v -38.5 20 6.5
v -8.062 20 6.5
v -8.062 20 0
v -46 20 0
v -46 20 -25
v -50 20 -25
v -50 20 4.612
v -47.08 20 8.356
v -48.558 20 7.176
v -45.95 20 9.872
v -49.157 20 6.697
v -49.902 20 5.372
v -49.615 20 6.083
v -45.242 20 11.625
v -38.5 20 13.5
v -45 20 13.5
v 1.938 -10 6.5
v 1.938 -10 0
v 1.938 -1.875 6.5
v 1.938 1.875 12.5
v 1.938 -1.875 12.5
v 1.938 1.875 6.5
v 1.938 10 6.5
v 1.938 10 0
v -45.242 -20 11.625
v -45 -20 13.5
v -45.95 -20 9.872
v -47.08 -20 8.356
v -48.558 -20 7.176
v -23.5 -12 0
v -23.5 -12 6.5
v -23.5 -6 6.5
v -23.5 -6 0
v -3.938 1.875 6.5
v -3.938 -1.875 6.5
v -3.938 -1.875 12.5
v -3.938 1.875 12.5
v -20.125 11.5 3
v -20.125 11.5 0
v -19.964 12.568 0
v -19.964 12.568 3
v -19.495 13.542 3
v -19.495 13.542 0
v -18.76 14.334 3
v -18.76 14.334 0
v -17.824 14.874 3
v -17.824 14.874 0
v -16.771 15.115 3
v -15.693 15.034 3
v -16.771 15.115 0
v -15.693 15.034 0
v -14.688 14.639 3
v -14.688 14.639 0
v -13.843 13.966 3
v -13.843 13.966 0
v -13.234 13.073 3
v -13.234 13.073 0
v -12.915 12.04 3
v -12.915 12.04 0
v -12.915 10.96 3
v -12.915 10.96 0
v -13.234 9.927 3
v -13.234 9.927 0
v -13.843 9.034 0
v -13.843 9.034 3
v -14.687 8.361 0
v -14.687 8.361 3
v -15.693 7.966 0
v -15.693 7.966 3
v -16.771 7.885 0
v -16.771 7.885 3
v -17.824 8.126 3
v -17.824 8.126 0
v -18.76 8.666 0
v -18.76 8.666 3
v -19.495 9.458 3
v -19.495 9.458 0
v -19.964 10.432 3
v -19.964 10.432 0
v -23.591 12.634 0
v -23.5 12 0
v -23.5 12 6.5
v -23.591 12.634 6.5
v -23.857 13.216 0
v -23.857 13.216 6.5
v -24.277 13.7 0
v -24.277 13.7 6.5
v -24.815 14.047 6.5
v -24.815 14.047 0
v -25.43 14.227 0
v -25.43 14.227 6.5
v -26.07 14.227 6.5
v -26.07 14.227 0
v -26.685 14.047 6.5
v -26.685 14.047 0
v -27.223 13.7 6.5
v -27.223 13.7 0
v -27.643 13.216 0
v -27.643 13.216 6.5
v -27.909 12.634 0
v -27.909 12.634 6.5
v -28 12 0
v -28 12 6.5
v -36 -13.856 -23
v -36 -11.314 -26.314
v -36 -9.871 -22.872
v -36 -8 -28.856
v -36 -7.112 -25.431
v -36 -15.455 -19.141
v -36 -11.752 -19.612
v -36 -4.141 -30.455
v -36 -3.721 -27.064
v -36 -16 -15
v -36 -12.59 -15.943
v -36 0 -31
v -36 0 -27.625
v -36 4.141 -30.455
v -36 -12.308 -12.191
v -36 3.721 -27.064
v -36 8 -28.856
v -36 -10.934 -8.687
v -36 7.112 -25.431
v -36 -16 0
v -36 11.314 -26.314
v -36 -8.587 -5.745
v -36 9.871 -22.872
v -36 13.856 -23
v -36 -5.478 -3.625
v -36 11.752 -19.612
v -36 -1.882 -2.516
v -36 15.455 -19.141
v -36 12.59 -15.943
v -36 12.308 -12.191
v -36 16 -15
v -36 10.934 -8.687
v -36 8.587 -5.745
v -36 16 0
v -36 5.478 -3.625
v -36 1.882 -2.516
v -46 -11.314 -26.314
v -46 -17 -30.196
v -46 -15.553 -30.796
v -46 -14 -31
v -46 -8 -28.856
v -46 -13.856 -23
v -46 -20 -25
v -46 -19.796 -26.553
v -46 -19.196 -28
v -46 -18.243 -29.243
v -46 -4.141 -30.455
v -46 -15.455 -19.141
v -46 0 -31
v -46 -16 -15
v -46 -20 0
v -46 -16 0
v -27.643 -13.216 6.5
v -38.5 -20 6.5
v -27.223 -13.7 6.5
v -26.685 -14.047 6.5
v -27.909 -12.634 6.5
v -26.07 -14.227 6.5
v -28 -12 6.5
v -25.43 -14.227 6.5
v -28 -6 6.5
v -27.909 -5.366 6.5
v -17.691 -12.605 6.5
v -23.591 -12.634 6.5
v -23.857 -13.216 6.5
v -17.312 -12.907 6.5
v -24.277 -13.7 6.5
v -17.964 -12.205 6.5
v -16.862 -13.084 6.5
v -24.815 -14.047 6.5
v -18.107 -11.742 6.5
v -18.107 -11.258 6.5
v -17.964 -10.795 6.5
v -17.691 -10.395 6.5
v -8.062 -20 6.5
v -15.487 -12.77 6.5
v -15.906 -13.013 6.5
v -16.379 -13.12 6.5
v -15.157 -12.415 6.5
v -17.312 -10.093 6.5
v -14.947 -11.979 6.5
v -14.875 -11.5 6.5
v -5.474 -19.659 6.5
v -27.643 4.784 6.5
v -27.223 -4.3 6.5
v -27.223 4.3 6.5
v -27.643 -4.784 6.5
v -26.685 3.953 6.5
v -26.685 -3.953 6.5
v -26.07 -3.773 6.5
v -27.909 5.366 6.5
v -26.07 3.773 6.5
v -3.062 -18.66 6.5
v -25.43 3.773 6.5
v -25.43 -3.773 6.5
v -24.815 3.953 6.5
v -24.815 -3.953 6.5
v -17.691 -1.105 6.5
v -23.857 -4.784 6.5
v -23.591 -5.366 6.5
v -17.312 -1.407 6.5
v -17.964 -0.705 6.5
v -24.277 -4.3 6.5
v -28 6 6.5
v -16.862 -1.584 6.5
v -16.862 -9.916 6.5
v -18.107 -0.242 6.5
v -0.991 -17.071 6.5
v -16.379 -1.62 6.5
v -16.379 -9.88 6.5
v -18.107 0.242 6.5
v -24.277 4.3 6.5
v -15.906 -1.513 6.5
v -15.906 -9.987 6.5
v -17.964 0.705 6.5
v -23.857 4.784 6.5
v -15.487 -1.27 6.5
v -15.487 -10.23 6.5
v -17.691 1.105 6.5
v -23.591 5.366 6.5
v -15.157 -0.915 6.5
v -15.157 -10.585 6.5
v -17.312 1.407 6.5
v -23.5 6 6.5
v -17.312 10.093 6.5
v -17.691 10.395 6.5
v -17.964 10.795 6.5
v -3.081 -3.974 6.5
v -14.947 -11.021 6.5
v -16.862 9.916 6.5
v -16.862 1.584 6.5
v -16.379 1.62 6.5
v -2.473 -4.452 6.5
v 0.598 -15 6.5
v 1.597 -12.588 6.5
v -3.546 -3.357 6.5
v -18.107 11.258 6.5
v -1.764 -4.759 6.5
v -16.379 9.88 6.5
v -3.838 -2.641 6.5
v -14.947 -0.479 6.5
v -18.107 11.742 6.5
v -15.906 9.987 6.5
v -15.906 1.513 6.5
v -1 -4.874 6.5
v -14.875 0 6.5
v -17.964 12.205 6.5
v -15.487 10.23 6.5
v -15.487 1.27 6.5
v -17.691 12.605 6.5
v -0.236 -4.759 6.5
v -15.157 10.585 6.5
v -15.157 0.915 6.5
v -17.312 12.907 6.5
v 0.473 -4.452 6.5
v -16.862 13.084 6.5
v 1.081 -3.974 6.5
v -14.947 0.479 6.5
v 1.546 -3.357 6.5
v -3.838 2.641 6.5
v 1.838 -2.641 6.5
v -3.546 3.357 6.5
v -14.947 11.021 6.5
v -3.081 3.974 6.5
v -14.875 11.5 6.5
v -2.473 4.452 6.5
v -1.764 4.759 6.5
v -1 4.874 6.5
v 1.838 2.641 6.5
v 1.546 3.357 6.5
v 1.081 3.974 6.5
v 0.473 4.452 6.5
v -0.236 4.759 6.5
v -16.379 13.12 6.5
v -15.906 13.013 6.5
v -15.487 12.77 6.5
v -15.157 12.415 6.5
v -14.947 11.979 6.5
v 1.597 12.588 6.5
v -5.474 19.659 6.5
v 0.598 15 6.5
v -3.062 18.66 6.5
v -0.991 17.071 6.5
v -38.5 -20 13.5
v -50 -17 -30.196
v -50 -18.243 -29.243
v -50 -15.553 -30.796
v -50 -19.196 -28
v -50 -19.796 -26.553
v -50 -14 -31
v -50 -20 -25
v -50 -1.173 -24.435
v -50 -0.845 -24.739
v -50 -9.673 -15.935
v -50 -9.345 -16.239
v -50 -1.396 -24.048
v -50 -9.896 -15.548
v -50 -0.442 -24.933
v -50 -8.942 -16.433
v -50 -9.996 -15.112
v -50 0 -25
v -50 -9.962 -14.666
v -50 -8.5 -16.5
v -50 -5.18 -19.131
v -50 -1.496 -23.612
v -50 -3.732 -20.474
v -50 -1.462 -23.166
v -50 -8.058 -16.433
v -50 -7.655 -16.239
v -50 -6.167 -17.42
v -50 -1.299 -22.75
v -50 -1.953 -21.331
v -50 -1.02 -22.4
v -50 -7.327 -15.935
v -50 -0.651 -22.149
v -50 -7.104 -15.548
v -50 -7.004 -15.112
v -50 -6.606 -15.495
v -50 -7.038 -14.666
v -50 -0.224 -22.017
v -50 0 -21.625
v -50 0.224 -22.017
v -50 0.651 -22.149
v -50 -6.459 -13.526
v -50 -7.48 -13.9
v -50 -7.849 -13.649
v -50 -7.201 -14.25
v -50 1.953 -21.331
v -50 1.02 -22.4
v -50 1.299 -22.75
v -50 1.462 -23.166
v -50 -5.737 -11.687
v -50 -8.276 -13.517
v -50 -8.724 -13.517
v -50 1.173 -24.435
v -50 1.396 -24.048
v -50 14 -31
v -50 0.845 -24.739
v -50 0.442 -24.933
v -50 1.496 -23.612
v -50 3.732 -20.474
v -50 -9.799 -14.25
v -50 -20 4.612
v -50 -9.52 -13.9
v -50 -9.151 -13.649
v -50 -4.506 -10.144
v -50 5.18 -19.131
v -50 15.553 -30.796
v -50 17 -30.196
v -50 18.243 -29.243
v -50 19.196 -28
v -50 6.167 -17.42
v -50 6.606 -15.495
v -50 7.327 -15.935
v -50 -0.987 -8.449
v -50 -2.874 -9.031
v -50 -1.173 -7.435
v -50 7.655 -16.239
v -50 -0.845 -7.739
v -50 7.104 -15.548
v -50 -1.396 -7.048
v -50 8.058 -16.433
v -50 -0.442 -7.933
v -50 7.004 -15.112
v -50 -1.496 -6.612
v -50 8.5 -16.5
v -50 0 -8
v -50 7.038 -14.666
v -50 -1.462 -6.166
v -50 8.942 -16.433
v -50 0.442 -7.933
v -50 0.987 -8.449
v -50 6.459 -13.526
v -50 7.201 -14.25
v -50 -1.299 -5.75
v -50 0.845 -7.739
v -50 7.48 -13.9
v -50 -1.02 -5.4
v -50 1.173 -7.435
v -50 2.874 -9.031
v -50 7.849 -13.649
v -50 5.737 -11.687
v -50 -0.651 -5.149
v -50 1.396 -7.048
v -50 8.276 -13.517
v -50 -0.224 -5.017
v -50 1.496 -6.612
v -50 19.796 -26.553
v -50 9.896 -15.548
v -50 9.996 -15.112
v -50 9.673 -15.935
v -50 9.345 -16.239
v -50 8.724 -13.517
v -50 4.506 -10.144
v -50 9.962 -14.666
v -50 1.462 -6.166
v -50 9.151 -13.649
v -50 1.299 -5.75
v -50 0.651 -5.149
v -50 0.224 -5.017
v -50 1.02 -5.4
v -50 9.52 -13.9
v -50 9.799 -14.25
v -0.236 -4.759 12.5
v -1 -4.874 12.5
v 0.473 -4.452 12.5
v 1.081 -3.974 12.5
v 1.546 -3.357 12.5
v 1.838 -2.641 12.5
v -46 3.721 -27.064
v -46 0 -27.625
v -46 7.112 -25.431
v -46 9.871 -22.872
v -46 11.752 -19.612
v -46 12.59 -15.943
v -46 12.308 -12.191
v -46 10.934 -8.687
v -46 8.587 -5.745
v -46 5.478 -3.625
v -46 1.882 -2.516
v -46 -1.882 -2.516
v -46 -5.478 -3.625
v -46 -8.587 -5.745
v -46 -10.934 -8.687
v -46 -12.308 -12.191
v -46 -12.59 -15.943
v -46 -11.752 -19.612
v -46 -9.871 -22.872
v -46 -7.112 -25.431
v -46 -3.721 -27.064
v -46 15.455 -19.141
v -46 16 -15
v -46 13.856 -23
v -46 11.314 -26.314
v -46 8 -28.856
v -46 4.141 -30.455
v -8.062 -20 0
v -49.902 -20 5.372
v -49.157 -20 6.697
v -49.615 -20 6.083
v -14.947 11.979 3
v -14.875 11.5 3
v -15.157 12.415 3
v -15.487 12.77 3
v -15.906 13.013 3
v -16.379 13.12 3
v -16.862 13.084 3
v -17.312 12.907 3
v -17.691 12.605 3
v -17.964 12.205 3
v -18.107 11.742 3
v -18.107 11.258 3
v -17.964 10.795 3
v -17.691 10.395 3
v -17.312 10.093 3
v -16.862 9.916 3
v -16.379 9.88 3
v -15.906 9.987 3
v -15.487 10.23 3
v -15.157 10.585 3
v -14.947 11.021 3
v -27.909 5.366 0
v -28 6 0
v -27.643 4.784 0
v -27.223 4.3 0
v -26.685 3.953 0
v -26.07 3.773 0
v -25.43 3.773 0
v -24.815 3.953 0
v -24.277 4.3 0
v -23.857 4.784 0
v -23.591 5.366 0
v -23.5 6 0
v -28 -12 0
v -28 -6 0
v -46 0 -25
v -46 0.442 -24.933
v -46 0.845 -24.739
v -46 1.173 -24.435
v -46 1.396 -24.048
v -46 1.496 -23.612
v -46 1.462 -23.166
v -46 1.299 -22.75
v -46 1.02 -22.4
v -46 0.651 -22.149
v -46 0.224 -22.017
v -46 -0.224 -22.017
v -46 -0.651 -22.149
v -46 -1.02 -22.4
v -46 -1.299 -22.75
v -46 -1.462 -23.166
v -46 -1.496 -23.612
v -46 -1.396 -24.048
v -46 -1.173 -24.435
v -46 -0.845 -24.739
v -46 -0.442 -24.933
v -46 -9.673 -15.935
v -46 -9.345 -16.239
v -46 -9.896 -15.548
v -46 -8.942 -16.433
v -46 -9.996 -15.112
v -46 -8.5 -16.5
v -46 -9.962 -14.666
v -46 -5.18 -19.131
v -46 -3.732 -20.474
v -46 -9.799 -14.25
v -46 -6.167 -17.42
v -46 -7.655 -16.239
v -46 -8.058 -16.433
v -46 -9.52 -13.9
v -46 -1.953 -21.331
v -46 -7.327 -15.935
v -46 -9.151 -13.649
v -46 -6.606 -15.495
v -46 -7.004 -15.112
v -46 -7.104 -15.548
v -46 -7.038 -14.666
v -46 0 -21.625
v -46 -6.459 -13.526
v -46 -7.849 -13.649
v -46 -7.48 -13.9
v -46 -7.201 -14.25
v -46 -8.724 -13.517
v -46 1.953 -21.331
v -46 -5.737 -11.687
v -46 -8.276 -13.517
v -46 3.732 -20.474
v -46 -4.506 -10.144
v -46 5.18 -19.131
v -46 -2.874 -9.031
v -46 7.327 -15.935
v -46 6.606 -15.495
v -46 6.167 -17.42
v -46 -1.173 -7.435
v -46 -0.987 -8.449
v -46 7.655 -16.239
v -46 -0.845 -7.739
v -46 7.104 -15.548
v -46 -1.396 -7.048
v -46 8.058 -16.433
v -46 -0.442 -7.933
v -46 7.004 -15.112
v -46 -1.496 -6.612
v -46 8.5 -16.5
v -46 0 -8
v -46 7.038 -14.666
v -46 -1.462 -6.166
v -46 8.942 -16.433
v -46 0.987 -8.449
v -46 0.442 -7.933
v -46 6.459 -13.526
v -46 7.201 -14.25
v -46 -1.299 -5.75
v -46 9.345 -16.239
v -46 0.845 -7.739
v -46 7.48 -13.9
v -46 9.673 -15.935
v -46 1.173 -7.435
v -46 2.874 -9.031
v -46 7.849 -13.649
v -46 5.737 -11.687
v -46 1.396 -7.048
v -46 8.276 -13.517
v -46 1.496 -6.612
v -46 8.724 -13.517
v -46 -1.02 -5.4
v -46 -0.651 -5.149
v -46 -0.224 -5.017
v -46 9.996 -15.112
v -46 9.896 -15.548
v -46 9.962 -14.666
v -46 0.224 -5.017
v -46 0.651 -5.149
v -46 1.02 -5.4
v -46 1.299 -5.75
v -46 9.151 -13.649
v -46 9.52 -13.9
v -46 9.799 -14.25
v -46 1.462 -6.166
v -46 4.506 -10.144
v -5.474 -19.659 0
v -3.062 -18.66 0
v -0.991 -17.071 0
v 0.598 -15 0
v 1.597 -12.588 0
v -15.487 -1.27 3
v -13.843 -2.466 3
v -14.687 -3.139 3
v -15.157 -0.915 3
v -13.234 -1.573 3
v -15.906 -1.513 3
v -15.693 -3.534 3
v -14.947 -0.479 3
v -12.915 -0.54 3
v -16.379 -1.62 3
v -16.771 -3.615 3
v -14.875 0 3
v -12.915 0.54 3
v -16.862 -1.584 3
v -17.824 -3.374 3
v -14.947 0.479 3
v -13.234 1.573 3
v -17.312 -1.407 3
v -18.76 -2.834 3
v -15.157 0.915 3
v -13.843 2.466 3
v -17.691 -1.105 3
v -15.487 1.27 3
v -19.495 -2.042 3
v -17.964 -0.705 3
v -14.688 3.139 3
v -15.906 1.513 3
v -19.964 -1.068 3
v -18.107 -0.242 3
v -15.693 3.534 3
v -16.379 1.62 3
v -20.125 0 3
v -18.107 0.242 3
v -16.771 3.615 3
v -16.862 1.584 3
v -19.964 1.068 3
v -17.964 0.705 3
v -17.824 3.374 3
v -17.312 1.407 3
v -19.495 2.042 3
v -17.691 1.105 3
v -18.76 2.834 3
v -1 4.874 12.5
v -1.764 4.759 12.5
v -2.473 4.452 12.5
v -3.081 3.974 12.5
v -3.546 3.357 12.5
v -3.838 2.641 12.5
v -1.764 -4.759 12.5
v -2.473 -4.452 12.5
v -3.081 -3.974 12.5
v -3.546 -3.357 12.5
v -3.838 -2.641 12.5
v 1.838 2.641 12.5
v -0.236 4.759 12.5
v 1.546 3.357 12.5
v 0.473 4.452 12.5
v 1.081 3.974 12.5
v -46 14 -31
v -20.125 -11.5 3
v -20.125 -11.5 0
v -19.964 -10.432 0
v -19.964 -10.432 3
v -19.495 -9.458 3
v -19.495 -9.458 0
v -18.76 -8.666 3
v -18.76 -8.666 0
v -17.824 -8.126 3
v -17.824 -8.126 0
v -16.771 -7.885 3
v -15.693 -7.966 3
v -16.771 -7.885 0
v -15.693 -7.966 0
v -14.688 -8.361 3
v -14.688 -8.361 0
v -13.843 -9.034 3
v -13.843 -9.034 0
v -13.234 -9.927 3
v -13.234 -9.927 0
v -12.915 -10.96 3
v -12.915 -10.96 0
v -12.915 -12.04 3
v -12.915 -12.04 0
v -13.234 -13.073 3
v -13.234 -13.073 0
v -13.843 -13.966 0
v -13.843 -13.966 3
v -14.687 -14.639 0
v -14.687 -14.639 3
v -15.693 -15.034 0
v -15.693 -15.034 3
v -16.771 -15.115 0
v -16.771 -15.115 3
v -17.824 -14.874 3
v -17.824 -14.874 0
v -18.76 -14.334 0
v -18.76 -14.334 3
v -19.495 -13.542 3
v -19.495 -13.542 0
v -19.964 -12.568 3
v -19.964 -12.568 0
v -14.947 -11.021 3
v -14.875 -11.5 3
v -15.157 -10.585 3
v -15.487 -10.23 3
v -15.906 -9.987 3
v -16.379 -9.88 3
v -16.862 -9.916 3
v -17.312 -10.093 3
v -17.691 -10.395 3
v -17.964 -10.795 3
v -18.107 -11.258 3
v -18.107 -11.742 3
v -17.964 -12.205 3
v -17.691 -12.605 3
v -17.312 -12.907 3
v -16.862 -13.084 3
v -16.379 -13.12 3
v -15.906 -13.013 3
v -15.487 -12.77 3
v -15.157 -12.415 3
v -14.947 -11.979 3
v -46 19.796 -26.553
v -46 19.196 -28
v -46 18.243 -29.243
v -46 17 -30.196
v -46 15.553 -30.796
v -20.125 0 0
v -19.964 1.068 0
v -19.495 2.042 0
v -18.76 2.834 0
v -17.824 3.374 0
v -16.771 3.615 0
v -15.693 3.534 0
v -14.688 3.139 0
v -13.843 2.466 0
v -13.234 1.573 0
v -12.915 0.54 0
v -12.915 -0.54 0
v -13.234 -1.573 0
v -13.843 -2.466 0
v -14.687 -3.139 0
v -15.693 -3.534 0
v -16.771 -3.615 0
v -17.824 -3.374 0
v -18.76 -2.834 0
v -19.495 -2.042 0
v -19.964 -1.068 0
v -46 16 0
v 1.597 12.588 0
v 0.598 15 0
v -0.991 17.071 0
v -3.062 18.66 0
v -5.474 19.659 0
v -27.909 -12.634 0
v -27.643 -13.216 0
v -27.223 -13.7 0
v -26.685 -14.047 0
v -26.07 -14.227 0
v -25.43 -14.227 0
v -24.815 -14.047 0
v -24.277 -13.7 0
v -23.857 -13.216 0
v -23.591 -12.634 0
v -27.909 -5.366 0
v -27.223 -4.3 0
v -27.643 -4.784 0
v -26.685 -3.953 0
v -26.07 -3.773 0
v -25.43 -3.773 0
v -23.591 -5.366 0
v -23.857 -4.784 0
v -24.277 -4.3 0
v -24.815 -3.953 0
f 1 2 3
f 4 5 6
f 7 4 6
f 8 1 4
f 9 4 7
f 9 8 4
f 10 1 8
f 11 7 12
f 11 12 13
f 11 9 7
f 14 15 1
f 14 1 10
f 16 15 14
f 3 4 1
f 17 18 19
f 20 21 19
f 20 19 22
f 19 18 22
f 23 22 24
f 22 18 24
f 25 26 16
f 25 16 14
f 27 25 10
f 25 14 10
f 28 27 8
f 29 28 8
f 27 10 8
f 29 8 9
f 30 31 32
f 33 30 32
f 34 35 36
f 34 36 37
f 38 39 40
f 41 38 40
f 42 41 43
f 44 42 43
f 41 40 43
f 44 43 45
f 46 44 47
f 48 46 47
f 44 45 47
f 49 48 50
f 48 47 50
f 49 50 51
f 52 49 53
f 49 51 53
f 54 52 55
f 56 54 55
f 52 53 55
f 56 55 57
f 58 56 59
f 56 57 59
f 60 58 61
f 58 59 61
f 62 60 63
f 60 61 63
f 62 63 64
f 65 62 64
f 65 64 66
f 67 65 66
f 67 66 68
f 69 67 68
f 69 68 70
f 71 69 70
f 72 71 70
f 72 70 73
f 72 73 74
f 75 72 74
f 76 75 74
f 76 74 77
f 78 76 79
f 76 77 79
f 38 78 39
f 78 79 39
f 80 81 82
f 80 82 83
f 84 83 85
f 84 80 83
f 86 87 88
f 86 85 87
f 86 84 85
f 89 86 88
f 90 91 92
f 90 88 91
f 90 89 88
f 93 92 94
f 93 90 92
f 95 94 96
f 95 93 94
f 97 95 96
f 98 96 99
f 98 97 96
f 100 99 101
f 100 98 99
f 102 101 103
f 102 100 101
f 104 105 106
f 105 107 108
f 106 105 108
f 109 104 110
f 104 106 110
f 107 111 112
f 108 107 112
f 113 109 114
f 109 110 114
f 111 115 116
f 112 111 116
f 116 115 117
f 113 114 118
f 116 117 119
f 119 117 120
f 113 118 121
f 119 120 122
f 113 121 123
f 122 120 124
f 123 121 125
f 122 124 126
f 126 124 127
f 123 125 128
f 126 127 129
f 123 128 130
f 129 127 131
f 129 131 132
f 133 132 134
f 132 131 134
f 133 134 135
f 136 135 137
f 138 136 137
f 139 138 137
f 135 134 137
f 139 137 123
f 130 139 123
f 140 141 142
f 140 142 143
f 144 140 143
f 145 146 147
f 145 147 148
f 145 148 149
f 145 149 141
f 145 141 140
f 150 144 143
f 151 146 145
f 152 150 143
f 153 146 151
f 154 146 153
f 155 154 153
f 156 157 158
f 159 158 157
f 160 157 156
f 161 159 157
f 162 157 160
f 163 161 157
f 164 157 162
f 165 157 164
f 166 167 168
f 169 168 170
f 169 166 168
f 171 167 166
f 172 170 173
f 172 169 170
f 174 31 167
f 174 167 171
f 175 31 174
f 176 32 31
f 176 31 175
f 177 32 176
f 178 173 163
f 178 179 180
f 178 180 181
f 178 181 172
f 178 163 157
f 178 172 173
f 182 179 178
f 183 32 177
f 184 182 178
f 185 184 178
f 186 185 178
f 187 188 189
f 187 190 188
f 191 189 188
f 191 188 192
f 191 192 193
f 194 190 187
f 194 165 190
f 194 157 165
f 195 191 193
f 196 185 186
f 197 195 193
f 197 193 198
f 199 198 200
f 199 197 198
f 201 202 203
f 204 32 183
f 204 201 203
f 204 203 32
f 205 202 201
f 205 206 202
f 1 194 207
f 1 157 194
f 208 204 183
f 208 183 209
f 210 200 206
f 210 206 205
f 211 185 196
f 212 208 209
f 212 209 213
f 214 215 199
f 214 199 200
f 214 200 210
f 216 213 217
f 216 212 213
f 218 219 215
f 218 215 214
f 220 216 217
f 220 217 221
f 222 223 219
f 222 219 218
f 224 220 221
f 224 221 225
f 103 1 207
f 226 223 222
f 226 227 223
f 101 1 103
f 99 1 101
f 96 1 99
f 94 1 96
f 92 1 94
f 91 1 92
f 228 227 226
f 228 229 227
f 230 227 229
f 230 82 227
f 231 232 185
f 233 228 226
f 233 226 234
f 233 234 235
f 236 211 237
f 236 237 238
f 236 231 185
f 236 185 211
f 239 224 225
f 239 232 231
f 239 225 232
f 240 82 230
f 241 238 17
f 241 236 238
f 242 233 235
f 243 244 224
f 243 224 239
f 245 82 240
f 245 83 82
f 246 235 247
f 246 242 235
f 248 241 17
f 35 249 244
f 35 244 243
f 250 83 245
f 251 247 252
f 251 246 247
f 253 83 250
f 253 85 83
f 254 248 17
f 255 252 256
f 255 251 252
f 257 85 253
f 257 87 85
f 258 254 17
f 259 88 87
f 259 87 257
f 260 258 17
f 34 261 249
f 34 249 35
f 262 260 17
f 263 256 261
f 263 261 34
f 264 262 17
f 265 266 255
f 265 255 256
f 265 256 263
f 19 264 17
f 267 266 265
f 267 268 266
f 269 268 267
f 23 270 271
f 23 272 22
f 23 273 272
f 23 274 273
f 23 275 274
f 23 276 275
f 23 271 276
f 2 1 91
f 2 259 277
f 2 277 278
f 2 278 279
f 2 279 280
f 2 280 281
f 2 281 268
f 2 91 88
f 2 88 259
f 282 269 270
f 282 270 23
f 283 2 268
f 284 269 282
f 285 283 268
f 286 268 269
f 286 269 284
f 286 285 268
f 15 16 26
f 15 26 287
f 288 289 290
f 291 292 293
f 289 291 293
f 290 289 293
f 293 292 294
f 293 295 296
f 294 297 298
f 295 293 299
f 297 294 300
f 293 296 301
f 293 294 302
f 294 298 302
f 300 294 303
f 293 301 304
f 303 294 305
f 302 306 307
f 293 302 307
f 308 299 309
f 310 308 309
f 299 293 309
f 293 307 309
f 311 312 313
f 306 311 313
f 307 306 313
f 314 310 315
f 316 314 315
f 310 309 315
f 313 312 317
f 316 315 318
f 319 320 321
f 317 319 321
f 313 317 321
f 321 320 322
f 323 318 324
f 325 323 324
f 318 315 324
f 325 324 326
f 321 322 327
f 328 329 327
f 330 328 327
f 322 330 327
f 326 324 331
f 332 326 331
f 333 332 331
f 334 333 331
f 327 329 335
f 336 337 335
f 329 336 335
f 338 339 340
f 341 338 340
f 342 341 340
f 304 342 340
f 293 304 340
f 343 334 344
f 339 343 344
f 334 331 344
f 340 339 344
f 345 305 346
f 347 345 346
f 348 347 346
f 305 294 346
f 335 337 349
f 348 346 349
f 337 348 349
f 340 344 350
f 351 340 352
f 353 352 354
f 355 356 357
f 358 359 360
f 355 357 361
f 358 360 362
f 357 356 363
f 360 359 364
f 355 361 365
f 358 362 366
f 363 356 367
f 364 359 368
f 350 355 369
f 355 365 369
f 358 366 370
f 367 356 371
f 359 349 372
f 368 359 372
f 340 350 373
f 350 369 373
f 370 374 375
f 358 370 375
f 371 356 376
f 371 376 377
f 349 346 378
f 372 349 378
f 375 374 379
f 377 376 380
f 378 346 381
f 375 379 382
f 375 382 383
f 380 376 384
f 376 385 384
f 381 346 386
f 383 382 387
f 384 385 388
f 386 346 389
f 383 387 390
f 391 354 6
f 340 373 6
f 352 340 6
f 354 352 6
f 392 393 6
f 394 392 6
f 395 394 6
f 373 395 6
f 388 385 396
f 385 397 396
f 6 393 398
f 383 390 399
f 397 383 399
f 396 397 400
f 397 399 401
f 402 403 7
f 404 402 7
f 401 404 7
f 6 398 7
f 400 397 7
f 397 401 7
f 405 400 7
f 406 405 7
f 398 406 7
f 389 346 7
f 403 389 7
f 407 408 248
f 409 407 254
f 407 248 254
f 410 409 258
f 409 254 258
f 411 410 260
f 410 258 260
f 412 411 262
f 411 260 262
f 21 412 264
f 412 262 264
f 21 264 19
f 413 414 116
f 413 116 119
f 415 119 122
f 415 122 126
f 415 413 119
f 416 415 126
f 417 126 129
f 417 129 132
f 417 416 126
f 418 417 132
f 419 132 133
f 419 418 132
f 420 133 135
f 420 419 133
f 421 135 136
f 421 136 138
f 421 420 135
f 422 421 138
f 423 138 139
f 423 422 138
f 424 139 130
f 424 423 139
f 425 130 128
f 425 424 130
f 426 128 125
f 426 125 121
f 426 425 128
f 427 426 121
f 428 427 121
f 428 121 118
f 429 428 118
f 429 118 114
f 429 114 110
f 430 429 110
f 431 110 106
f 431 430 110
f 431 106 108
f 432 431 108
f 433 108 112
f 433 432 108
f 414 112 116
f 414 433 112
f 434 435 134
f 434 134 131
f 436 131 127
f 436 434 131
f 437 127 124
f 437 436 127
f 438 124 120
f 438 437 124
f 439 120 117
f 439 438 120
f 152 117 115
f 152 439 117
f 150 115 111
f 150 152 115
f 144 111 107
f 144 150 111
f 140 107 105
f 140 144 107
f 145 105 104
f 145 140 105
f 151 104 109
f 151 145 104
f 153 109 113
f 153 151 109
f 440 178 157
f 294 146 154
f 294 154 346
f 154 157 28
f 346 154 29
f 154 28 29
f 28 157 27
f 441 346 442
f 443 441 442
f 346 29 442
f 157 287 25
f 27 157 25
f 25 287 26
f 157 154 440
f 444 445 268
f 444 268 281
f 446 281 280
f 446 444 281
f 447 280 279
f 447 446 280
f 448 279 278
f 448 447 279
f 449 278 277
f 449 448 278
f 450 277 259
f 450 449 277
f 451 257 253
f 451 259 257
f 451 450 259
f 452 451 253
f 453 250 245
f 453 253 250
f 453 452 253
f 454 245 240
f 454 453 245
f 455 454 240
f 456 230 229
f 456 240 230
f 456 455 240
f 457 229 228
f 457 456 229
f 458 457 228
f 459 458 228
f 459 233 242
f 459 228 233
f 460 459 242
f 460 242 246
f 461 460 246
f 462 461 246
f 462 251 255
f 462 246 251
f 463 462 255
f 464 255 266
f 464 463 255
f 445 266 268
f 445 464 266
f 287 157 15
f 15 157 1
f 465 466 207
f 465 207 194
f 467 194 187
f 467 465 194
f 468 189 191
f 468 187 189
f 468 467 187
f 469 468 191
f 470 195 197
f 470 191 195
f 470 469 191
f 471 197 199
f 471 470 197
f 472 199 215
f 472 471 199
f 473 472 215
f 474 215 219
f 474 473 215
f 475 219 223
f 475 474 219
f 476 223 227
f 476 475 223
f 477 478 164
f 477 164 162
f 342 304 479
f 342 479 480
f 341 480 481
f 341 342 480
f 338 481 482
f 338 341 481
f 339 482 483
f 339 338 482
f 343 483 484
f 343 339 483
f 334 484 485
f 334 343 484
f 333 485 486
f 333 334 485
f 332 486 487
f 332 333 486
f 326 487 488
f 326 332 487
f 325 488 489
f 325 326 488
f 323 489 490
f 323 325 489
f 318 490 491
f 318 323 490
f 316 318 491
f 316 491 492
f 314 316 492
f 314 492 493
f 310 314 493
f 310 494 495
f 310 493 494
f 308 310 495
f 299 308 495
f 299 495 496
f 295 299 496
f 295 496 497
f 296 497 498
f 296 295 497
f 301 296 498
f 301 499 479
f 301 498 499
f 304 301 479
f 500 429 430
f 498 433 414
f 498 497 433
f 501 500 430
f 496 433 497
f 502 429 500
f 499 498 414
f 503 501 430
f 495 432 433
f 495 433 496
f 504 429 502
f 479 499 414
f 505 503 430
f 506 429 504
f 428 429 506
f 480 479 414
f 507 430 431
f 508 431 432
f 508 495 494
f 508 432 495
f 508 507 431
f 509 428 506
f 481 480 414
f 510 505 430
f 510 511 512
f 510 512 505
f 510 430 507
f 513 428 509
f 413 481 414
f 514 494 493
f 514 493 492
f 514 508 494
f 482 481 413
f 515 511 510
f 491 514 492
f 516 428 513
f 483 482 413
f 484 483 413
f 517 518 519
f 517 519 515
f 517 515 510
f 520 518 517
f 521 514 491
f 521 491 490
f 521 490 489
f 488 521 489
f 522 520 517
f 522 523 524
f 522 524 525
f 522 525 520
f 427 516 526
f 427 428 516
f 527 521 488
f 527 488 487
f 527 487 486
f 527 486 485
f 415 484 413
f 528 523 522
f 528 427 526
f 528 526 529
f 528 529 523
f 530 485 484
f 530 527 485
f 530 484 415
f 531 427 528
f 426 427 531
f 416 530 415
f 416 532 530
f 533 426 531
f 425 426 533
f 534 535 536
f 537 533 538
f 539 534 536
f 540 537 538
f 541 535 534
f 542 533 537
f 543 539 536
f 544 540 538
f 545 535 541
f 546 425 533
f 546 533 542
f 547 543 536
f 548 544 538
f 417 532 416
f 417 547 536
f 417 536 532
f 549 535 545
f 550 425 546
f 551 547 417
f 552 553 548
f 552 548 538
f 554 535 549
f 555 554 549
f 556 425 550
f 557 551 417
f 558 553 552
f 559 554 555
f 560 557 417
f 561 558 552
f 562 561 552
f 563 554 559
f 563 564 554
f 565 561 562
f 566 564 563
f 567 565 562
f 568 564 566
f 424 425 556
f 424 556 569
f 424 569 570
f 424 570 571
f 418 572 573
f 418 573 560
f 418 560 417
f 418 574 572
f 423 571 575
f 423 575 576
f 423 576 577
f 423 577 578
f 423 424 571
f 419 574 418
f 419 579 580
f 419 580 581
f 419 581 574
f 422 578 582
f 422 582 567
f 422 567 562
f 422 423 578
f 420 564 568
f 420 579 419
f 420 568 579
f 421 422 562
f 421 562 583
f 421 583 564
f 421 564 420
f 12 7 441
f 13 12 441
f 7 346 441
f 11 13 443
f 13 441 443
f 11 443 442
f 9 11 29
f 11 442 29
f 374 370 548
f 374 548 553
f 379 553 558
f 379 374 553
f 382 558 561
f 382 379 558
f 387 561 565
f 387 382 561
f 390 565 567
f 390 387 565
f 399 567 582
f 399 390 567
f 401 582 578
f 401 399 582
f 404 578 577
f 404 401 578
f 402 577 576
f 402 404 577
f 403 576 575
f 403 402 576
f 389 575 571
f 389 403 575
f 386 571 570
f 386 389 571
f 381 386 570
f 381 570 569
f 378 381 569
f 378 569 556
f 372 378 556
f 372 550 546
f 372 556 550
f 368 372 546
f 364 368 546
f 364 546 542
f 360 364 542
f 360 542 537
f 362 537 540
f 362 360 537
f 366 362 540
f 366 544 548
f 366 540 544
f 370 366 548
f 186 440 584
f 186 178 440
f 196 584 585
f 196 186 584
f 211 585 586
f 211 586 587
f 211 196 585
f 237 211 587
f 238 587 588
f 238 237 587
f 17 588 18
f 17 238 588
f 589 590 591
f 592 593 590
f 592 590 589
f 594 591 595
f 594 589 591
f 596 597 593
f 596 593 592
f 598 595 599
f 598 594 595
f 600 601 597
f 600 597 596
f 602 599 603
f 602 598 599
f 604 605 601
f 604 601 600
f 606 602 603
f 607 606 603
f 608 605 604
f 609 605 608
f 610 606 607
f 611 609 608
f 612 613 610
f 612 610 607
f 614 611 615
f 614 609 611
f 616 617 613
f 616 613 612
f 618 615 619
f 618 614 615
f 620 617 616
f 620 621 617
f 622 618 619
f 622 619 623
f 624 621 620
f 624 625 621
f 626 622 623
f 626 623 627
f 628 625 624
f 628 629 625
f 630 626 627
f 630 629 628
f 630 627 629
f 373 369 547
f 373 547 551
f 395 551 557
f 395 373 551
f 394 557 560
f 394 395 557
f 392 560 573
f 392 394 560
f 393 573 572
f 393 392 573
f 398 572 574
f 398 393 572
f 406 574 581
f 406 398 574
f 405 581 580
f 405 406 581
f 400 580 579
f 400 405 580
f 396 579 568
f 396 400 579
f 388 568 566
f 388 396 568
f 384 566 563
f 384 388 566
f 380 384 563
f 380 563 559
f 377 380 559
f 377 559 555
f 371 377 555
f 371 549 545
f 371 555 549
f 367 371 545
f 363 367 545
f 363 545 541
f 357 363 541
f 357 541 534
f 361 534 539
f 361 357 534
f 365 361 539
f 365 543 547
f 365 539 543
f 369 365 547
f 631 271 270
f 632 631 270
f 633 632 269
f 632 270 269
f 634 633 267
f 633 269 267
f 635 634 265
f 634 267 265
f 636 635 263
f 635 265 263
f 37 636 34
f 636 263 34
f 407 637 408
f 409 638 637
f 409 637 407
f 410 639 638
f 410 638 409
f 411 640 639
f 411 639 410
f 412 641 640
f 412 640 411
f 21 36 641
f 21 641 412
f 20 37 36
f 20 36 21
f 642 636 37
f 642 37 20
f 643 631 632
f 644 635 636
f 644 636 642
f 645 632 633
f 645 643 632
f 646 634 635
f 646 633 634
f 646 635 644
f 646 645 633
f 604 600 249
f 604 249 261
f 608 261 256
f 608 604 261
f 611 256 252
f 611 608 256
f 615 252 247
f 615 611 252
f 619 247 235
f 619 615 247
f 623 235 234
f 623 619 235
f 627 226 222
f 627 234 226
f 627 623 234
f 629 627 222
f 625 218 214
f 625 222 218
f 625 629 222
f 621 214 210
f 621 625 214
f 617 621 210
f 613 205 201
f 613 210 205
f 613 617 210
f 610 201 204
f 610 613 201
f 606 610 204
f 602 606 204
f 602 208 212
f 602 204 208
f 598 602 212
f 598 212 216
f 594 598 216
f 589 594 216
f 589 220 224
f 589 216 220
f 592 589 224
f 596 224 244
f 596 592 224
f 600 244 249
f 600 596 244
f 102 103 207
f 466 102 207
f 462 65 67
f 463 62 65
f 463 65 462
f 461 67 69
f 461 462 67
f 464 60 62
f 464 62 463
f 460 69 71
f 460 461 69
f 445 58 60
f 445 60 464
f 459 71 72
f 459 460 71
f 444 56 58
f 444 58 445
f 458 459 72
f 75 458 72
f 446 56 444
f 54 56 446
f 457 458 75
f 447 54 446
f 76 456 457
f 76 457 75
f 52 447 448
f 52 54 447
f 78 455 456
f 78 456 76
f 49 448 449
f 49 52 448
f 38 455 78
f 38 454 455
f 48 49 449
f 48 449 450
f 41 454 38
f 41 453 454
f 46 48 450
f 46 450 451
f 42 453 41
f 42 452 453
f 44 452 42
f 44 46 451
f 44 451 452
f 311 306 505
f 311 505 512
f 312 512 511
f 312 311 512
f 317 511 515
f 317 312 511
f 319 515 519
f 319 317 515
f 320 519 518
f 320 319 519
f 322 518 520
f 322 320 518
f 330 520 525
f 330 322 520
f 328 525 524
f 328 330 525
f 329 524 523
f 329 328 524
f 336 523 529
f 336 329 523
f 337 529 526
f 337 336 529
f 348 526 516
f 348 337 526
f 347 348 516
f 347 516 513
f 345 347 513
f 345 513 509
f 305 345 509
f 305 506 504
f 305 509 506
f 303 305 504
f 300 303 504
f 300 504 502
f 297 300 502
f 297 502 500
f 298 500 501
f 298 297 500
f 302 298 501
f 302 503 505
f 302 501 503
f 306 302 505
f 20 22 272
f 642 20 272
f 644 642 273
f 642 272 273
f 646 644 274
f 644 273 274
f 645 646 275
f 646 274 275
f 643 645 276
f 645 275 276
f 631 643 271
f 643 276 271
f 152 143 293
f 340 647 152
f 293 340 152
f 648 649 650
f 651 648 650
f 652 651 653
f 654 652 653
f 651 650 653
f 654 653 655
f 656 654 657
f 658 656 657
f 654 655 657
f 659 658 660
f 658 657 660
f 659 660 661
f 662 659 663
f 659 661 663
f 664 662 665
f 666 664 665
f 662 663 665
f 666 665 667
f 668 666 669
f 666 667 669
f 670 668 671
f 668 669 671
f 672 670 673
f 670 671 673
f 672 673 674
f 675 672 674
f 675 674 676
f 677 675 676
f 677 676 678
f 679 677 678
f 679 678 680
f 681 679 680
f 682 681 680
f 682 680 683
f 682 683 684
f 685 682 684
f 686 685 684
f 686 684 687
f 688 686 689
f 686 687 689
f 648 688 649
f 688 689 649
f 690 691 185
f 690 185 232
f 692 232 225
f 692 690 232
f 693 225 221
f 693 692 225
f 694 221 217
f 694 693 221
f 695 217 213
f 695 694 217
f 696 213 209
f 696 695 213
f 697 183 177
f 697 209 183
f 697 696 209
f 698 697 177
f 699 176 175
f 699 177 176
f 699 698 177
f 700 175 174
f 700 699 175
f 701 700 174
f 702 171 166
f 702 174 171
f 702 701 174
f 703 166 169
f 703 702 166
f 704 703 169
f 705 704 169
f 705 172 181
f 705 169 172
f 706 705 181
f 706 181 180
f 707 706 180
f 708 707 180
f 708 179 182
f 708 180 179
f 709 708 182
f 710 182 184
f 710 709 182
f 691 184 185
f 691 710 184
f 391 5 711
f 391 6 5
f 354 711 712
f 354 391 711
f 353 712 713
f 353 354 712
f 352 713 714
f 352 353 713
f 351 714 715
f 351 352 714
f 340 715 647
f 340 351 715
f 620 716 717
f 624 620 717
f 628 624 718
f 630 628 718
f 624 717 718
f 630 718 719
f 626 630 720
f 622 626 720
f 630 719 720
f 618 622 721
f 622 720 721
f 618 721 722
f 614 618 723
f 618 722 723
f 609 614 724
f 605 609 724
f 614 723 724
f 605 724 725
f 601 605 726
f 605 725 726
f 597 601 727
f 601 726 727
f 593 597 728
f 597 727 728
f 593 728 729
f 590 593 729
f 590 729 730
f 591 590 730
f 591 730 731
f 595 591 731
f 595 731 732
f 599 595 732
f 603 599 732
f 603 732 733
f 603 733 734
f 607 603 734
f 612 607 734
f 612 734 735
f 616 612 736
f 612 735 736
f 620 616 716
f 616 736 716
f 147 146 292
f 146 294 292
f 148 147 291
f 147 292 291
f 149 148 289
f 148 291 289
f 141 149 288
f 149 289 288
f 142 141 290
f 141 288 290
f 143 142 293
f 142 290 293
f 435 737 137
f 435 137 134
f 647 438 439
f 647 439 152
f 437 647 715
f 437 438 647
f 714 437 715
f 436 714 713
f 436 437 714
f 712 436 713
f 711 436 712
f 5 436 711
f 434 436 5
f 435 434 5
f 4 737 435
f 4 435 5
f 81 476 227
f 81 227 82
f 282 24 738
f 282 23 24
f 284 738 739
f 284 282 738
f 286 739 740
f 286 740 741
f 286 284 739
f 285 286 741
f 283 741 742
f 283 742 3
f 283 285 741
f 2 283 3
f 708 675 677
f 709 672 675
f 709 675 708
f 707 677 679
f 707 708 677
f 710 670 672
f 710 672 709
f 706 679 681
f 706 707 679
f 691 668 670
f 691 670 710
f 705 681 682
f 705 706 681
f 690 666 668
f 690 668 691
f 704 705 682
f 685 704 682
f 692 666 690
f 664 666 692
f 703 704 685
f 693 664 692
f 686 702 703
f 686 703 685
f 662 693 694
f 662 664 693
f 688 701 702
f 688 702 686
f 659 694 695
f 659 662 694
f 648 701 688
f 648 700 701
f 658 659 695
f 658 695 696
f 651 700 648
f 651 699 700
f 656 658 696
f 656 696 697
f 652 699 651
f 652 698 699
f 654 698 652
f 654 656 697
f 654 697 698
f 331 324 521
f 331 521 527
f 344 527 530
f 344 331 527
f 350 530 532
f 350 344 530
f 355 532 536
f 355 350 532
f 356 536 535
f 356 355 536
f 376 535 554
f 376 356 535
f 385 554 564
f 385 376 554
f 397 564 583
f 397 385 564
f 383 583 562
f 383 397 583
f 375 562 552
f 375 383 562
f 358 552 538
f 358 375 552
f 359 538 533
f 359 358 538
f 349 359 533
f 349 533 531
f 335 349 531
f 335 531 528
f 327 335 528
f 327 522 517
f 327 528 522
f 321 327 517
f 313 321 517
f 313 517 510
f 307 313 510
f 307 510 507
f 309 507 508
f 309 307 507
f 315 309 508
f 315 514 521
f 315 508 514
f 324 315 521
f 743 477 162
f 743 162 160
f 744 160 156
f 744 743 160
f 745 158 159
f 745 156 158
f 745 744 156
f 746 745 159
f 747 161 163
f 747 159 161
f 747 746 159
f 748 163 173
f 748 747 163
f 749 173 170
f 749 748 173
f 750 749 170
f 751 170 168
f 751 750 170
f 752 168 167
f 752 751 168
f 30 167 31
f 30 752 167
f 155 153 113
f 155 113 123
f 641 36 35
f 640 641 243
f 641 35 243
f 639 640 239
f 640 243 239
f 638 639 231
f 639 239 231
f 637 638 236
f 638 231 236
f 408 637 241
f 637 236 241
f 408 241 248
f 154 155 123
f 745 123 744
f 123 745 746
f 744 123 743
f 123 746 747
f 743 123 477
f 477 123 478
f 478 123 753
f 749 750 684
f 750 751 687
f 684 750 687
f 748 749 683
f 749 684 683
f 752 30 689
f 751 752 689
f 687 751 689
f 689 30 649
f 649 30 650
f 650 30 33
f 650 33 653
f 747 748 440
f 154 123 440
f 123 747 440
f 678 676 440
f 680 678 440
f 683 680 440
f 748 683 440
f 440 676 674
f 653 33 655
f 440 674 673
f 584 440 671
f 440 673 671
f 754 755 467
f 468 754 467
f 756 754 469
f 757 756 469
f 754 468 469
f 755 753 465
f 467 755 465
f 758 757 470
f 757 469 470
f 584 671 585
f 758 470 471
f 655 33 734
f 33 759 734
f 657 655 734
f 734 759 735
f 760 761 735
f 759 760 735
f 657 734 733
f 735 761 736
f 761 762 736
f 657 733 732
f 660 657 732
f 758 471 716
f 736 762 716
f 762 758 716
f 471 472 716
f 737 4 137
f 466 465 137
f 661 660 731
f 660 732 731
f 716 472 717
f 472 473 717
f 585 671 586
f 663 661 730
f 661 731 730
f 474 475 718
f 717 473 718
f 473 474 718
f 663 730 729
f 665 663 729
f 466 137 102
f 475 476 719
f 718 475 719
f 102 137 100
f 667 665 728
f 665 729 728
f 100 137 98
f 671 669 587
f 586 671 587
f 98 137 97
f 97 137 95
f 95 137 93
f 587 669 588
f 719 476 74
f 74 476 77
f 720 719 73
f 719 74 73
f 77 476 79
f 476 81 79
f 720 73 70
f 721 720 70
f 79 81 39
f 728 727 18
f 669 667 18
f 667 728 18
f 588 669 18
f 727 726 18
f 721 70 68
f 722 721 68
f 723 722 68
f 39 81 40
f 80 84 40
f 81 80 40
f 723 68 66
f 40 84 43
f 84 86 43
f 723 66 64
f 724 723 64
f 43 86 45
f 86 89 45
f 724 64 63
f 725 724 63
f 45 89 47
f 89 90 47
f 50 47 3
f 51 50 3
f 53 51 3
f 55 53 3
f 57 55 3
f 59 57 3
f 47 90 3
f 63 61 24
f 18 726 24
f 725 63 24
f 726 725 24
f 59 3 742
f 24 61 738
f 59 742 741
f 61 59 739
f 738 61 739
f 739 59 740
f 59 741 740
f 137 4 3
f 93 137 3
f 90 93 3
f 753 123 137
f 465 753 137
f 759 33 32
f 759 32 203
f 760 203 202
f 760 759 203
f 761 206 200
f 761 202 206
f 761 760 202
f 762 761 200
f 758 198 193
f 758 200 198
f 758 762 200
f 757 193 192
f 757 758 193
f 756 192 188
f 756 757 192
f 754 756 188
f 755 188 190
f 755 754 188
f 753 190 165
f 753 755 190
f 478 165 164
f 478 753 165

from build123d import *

# Parameters (mm, degrees)
ESBO_O1_W                  = 85
ESBO_O1_H                  = 40
RESSALTO_EXTRUS_O1_DEPTH   = 6.5
ESBO_O2_W                  = 11.5
ESBO_O2_H                  = 40
RESSALTO_EXTRUS_O2_DEPTH   = 7
CORTE_EXTRUS_O1_DEPTH      = 55.30469593
CORTE_EXTRUS_O1_DEPTH_BACK = 55.30469593
ESBO_O3_R                  = 1.625
ESBO_O6_R                  = 3.625
CORTE_EXTRUS_O3_DEPTH      = 3
ESBO_O7_W                  = 4
ESBO_O7_H                  = 40
RESSALTO_EXTRUS_O4_DEPTH   = 31
ESBO_O8_R                  = 12.625
RESSALTO_EXTRUS_O8_DEPTH   = 10
CORTE_EXTRUS_O4_DEPTH      = 90.0056178
CORTE_EXTRUS_O4_DEPTH_BACK = 90.0056178
ESBO_O10_R                 = 6.625
ESBO_O10_R_2               = 1.5
FILETE1_R                  = 6
CORTE_EXTRUS_O5_DEPTH      = 40
FILETE3_R                  = 3
CORTE_EXTRUS_O7_DEPTH      = 66.622023742
CORTE_EXTRUS_O7_DEPTH_BACK = 66.622023742
ESBO_O14_W                 = 5.875
ESBO_O14_H                 = 9.75
RESSALTO_EXTRUS_O9_DEPTH   = 6
FILETE4_R                  = 3
CORTE_EXTRUS_O8_DEPTH      = 66.622023742
CORTE_EXTRUS_O8_DEPTH_BACK = 66.622023742
ESBO_O15_W                 = 33.0625
ESBO_O15_H                 = 40
FILETE5_R                  = 10


with BuildPart() as part:
    # Esboço1 → Ressalto-extrusão1 (new body)
    with BuildSketch(Plane.XY):
        with Locations((-7.5, 0)):
            Rectangle(ESBO_O1_W, ESBO_O1_H)
    extrude(amount=RESSALTO_EXTRUS_O1_DEPTH)

    # Esboço2 → Ressalto-extrusão2 (add)
    with BuildSketch(Plane.XY.offset(6.5)):
        with Locations((-44.25, 0)):
            Rectangle(ESBO_O2_W, ESBO_O2_H)
    extrude(amount=RESSALTO_EXTRUS_O2_DEPTH)

    # Esboço3 → Corte-extrusão1 (cut, two sides: drawn at the far end of the back side and taken through both)
    with BuildSketch(Plane.XY.offset(6.5).offset(-CORTE_EXTRUS_O1_DEPTH_BACK)):
        with Locations((-16.5, -11.5)):
            Circle(ESBO_O3_R)
        with Locations((-16.5, 0)):
            Circle(ESBO_O3_R)
        with Locations((-16.5, 11.5)):
            Circle(ESBO_O3_R)
    extrude(amount=CORTE_EXTRUS_O1_DEPTH + CORTE_EXTRUS_O1_DEPTH_BACK, mode=Mode.SUBTRACT)

    # Esboço6 → Corte-extrusão3 (cut)
    with BuildSketch(Plane(origin=(0, 0, 0), x_dir=(-1, 0, 0), z_dir=(0, 0, -1))):
        with Locations((16.5, -11.5)):
            Circle(ESBO_O6_R)
        with Locations((16.5, 0)):
            Circle(ESBO_O6_R)
        with Locations((16.5, 11.5)):
            Circle(ESBO_O6_R)
    extrude(amount=-CORTE_EXTRUS_O3_DEPTH, mode=Mode.SUBTRACT)

    # Esboço7 → Ressalto-extrusão4 (add)
    with BuildSketch(Plane(origin=(0, 0, 0), x_dir=(-1, 0, 0), z_dir=(0, 0, -1))):
        with Locations((48, 0)):
            Rectangle(ESBO_O7_W, ESBO_O7_H)
    extrude(amount=RESSALTO_EXTRUS_O4_DEPTH)

    # Esboço8 → Ressalto-extrusão8 (add)
    with BuildSketch(Plane(origin=(-46, 0, 0), x_dir=(0, 0, -1), z_dir=(1, 0, 0))):
        with BuildLine():
            Line((15, -16), (0, -16))
            Line((0, -16), (0, 16))
            Line((0, 16), (15, 16))
            ThreePointArc((15, 16), (31, 0), (15, -16))
        make_face()
        with Locations((15, 0)):
            Circle(ESBO_O8_R, mode=Mode.SUBTRACT)
    extrude(amount=RESSALTO_EXTRUS_O8_DEPTH)

    # Esboço10 → Corte-extrusão4 (cut, two sides: drawn at the far end of the back side and taken through both)
    with BuildSketch(Plane(origin=(-46, 0, 0), x_dir=(0, 0, -1), z_dir=(1, 0, 0)).offset(-CORTE_EXTRUS_O4_DEPTH_BACK)):
        with Locations((15, 0)):
            Circle(ESBO_O10_R)
        with Locations((15, -8.5)):
            Circle(ESBO_O10_R_2)
        with Locations((6.5, 0)):
            Circle(ESBO_O10_R_2)
        with Locations((15, 8.5)):
            Circle(ESBO_O10_R_2)
        with Locations((23.5, 0)):
            Circle(ESBO_O10_R_2)
    extrude(amount=CORTE_EXTRUS_O4_DEPTH + CORTE_EXTRUS_O4_DEPTH_BACK, mode=Mode.SUBTRACT)

    # Filete1
    filete1_edges = [part.edges().sort_by_distance(p)[0] for p in [
        (-48, 20, -31),
        (-48, -20, -31),
    ]]
    fillet(filete1_edges, radius=FILETE1_R)

    # Esboço11 → Corte-extrusão5 (cut)
    with BuildSketch(Plane(origin=(0, 20, 0), x_dir=(1, 0, 0), z_dir=(0, 1, 0))):
        with BuildLine():
            Line((-50, -6.5), (-50, -13.5))
            Line((-50, -13.5), (-45, -13.5))
            ThreePointArc((-45, -13.5), (-46.378372313, -9.198837366), (-50, -6.5))
        make_face()
    extrude(amount=-CORTE_EXTRUS_O5_DEPTH, mode=Mode.SUBTRACT)

    # Filete3
    filete3_edges = [part.edges().sort_by_distance(p)[0] for p in [
        (-50, 0, 6.5),
    ]]
    fillet(filete3_edges, radius=FILETE3_R)

    # Esboço13 → Corte-extrusão7 (cut, two sides: drawn at the far end of the back side and taken through both)
    with BuildSketch(Plane.XY.offset(6.5).offset(-CORTE_EXTRUS_O7_DEPTH_BACK)):
        with BuildLine():
            Line((-28, -6), (-28, -12))
            ThreePointArc((-28, -12), (-25.75, -14.25), (-23.5, -12))
            Line((-23.5, -12), (-23.5, -6))
            ThreePointArc((-23.5, -6), (-25.75, -3.75), (-28, -6))
        make_face()
        with BuildLine():
            Line((-23.5, 6), (-23.5, 12))
            ThreePointArc((-23.5, 12), (-25.75, 14.25), (-28, 12))
            Line((-28, 12), (-28, 6))
            ThreePointArc((-28, 6), (-25.75, 3.75), (-23.5, 6))
        make_face()
    extrude(amount=CORTE_EXTRUS_O7_DEPTH + CORTE_EXTRUS_O7_DEPTH_BACK, mode=Mode.SUBTRACT)

    # Esboço14 → Ressalto-extrusão9 (add)
    with BuildSketch(Plane.XY.offset(6.5)):
        with Locations((-1, 0)):
            Rectangle(ESBO_O14_W, ESBO_O14_H)
    extrude(amount=RESSALTO_EXTRUS_O9_DEPTH)

    # Filete4
    # the kernel refuses this fillet: 3 mm, written as the material it takes off along each edge
    with BuildSketch(Plane(origin=(-3.9375, 4.875, 6.5), x_dir=(0, -1, 0), z_dir=(0, 0, 1)), Plane(origin=(-3.9375, -4.875, 6.5), x_dir=(1, 0, 0), z_dir=(0, 0, 1)), Plane(origin=(1.9375, 4.875, 6.5), x_dir=(-1, 0, 0), z_dir=(0, 0, 1))) as filete4_piece_1:
        with BuildLine():
            CenterArc((FILETE4_R, FILETE4_R), FILETE4_R, 180, 90)
            Line((0, FILETE4_R), (0, 0))
            Line((0, 0), (FILETE4_R, 0))
        make_face()
    extrude(amount=13.5, mode=Mode.SUBTRACT)
    with BuildSketch(Plane(origin=(1.9375, -4.875, 6.5), x_dir=(-1, 0, 0), z_dir=(0, 0, 1))) as filete4_piece_2:
        with BuildLine():
            CenterArc((FILETE4_R, -FILETE4_R), FILETE4_R, 90, 90)
            Line((0, -FILETE4_R), (0, 0))
            Line((0, 0), (FILETE4_R, 0))
        make_face()
    extrude(amount=13.5, mode=Mode.SUBTRACT)

    # Esboço15 → Corte-extrusão8 (cut, two sides: drawn at the far end of the back side and taken through both)
    with BuildSketch(Plane.XY.offset(6.5).offset(-CORTE_EXTRUS_O8_DEPTH_BACK)):
        with Locations((18.46875, 0)):
            Rectangle(ESBO_O15_W, ESBO_O15_H)
    extrude(amount=CORTE_EXTRUS_O8_DEPTH + CORTE_EXTRUS_O8_DEPTH_BACK, mode=Mode.SUBTRACT)

    # Filete5
    filete5_edges = [part.edges().sort_by_distance(p)[0] for p in [
        (1.9375, 20, 3.25),
        (1.9375, -20, 3.25),
    ]]
    fillet(filete5_edges, radius=FILETE5_R)


solid = part.part
